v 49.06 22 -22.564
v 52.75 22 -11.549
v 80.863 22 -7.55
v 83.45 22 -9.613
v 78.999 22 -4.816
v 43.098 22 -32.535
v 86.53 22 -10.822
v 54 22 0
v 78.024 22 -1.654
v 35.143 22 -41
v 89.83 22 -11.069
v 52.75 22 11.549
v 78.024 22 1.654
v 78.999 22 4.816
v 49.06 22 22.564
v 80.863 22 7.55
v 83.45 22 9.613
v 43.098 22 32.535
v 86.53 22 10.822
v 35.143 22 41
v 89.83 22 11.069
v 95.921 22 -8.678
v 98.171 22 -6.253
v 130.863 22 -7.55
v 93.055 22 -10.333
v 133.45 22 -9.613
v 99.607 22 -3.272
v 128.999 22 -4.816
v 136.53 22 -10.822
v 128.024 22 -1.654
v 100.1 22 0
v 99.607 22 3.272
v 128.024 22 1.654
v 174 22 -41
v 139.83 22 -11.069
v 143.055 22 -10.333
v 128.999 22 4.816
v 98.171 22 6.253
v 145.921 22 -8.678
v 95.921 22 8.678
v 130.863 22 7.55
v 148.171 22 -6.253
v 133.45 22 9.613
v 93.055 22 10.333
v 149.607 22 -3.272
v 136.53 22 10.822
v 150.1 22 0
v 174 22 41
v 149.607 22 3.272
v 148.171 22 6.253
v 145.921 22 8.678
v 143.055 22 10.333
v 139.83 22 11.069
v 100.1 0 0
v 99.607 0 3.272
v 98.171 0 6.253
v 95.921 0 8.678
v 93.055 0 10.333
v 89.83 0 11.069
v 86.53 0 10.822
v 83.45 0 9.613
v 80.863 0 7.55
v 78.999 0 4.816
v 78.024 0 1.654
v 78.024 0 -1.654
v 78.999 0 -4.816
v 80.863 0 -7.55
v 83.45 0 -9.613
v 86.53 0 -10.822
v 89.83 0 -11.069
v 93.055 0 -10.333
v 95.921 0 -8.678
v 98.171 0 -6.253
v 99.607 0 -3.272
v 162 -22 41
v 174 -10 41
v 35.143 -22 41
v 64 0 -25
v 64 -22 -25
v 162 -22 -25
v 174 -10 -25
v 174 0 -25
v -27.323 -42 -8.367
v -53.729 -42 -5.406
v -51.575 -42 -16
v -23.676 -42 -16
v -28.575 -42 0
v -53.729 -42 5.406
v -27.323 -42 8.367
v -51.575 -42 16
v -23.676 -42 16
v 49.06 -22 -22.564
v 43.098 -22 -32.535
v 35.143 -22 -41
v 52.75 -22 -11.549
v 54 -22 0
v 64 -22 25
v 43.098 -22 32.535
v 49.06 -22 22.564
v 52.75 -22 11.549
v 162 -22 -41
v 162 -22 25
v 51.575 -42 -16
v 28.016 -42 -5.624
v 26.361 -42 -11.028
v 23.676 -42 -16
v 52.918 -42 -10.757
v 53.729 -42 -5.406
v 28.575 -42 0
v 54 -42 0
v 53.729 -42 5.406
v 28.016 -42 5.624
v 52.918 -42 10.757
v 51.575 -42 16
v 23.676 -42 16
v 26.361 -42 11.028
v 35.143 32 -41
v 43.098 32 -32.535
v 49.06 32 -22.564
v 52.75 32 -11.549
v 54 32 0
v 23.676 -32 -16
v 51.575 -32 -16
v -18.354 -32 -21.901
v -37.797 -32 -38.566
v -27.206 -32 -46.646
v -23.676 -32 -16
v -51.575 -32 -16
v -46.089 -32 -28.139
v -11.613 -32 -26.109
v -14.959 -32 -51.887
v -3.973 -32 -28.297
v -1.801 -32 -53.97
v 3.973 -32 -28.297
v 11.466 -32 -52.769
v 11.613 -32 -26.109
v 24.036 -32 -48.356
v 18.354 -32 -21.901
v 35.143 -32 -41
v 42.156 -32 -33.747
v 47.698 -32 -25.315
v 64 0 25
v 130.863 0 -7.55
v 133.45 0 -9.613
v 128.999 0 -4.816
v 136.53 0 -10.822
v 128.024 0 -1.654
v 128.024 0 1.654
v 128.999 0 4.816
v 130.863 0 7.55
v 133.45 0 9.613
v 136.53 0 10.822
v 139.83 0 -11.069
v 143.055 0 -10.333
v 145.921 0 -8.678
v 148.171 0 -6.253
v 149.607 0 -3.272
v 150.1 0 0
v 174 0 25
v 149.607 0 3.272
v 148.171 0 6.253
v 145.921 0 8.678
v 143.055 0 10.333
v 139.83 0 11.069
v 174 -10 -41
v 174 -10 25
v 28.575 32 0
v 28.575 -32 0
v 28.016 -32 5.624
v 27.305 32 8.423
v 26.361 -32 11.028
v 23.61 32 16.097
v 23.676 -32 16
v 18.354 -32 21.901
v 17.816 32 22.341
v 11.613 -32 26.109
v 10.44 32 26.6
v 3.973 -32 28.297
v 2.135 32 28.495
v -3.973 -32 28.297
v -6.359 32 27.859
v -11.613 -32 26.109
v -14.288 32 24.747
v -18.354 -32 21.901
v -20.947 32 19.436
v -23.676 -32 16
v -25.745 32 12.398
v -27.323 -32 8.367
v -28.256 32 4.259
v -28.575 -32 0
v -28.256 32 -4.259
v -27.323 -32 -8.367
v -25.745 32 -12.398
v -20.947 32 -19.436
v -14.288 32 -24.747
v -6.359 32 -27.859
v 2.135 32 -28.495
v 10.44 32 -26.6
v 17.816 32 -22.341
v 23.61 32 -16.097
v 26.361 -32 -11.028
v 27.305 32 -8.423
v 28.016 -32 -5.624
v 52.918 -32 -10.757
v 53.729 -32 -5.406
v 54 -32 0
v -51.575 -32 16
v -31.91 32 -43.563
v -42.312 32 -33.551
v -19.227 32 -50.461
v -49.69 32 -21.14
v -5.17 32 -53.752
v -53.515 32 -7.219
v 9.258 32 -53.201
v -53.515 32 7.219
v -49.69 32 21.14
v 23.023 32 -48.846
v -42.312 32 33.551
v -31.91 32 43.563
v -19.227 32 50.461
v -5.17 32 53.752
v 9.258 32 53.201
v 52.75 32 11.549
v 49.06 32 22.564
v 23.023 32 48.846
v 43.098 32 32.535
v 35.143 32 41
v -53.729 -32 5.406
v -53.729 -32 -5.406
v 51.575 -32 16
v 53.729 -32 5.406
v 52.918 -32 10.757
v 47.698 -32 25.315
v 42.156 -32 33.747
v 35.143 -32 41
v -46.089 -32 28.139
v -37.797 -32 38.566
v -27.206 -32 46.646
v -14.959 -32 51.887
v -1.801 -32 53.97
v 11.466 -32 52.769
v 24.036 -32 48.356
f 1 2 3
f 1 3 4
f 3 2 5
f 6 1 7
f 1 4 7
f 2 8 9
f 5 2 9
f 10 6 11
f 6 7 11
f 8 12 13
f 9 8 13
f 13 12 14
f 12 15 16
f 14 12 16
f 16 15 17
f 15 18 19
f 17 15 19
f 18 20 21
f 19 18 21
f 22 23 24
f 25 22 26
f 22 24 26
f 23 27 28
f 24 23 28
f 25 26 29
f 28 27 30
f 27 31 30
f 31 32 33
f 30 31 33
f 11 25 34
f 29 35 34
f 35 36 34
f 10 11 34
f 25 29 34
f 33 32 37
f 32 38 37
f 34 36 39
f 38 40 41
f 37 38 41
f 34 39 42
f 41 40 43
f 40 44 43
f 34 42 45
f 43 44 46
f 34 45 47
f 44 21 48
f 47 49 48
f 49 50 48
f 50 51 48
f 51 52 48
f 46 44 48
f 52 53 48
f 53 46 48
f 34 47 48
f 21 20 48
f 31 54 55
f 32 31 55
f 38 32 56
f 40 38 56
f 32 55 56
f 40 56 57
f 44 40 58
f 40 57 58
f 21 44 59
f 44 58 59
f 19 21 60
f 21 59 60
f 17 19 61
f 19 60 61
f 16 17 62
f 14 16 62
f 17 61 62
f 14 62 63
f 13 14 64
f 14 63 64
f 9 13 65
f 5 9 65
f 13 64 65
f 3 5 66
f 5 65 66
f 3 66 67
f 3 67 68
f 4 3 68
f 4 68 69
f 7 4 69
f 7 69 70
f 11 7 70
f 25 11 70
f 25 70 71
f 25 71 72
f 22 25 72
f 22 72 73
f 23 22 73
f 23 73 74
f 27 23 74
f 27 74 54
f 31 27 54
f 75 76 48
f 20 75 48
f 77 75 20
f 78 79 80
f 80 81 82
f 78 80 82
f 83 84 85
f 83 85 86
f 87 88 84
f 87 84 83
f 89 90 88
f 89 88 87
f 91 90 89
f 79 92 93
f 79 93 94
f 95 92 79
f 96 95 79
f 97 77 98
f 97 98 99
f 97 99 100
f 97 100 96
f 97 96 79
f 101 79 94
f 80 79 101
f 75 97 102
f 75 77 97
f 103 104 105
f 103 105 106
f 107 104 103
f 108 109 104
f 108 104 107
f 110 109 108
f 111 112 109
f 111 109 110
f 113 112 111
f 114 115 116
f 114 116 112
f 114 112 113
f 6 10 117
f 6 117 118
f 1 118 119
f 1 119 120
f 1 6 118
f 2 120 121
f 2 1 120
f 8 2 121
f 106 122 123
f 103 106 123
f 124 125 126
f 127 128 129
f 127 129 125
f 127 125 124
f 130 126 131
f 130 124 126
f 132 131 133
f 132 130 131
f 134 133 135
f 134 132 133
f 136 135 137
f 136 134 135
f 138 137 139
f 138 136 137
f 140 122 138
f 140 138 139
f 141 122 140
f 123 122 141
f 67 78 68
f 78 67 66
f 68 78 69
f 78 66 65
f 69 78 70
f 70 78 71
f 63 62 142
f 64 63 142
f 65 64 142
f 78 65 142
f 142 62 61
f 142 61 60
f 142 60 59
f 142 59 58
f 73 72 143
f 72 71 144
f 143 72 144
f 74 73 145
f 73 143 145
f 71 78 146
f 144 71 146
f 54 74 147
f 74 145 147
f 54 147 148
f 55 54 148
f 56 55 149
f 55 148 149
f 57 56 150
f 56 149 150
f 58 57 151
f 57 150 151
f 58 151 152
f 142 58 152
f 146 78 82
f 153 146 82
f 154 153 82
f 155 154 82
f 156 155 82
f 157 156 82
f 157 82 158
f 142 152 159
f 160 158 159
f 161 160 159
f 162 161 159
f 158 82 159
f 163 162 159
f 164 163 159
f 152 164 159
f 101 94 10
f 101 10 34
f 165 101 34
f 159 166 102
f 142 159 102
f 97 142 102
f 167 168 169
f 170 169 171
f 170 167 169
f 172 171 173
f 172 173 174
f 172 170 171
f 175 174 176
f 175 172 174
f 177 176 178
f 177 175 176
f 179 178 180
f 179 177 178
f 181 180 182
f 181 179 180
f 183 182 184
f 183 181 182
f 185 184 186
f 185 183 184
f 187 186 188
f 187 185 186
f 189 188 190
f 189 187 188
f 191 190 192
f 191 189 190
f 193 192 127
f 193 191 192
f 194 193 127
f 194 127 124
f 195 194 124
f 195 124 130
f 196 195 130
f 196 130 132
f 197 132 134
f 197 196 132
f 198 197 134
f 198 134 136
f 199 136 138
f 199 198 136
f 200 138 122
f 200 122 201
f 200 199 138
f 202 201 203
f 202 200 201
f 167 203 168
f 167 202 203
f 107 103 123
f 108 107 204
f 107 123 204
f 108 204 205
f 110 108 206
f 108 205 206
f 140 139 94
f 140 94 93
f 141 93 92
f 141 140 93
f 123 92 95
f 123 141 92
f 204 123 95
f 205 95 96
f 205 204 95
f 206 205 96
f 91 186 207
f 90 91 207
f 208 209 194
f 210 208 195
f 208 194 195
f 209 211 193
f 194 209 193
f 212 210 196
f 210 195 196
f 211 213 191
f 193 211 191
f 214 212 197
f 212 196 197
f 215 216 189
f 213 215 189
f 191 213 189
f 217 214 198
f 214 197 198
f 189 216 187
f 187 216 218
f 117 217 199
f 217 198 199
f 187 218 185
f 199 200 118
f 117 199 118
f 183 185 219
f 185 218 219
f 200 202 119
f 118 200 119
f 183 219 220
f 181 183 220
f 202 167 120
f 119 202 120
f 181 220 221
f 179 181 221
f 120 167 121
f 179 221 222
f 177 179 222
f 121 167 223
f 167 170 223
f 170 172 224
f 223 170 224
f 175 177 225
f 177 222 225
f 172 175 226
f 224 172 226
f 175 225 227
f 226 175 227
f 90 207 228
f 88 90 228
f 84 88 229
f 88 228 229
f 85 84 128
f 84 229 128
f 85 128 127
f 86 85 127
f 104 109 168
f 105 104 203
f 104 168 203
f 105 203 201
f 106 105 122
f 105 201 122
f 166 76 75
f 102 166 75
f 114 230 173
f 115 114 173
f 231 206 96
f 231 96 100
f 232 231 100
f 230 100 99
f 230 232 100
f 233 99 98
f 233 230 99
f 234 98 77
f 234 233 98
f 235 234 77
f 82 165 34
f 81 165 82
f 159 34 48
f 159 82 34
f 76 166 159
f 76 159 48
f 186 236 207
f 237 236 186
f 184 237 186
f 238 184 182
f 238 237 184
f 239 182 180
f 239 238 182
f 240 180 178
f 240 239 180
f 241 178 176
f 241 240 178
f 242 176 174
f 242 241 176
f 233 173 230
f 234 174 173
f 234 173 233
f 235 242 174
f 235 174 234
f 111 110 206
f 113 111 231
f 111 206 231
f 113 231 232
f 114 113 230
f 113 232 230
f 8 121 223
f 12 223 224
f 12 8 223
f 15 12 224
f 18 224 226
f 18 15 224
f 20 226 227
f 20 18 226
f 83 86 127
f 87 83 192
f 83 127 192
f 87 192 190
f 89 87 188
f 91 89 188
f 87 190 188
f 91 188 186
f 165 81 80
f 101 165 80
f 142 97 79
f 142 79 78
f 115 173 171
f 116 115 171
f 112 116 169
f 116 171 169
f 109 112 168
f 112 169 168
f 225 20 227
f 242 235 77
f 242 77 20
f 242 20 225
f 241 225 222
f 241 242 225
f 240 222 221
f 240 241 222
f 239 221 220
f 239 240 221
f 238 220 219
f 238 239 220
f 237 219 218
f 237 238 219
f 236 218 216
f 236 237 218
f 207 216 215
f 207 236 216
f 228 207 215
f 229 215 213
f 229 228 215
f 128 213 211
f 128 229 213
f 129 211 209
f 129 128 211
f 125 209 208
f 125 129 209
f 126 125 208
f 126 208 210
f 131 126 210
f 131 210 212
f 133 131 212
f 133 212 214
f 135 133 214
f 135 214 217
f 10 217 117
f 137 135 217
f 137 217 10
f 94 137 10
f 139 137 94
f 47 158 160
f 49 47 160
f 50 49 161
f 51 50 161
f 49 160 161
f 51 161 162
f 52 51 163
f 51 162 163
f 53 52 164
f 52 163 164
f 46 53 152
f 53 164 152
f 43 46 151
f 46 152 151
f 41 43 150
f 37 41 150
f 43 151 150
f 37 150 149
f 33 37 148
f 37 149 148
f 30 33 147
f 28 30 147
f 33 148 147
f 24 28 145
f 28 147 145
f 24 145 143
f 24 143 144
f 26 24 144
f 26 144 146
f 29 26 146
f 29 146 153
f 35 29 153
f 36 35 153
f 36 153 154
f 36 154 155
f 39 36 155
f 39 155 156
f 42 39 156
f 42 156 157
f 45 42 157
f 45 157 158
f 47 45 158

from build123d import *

# Parameters (mm, degrees)
F0_R      = 28.575
F1_DEPTH  = 32
F2_DEPTH  = 22
F4_DEPTH  = 95.001
F5_W      = 12
F5_H      = 50
F5_W_2    = 10
F6_DEPTH  = 110
F8_DEPTH  = 10
F9_R      = 11.1
F10_DEPTH = 32.001


with BuildPart() as f1:
    # F0 (on Front) → F1 (new body, symmetric)
    with BuildSketch(Plane.XZ):
        with BuildLine():
            ThreePointArc((35.142567, -41), (49.05965, -22.564368), (54, 0))
            ThreePointArc((54, 0), (49.05965, 22.564368), (35.142567, 41))
            ThreePointArc((35.142567, 41), (-54, 0), (35.142567, -41))
        make_face()
        Circle(F0_R, mode=Mode.SUBTRACT)
    extrude(amount=F1_DEPTH, both=True)

    # F0 (on Front) → F2 (join, symmetric)
    with BuildSketch(Plane.XZ):
        with BuildLine():
            ThreePointArc((35.142567, 41), (49.05965, 22.564368), (54, 0))
            ThreePointArc((54, 0), (49.05965, -22.564368), (35.142567, -41))
            Line((35.142567, -41), (174, -41))
            Line((174, -41), (174, 41))
            Line((174, 41), (35.142567, 41))
        make_face()
    extrude(amount=F2_DEPTH, both=True)

    # F3 (on face) → F4 (cut, through all)
    with BuildSketch(Plane.XY.offset(41)):
        Polygon((174, -10), (162, -22), (174, -22), align=None)
    extrude(amount=-F4_DEPTH, mode=Mode.SUBTRACT)

    # F5 (on face) → F6 (cut)
    with BuildSketch(Plane.YZ.offset(174)):
        with Locations((-16, 0)):
            Rectangle(F5_W, F5_H)
        with Locations((-5, 0)):
            Rectangle(F5_W_2, F5_H)
    extrude(amount=-F6_DEPTH, mode=Mode.SUBTRACT)

    # F7 (on face) → F8 (join)
    with BuildSketch(Plane.XZ.offset(32)):
        with BuildLine():
            Line((-23.675528, 16), (-51.575188, 16))
            ThreePointArc((-51.575188, 16), (-54, 0), (-51.575188, -16))
            Line((-51.575188, -16), (-23.675528, -16))
            ThreePointArc((-23.675528, -16), (-28.575, 0), (-23.675528, 16))
        make_face()
        with BuildLine():
            Line((51.575188, 16), (23.675528, 16))
            ThreePointArc((23.675528, 16), (27.322691, 8.366672), (28.575, 0))
            ThreePointArc((28.575, 0), (27.322691, -8.366672), (23.675528, -16))
            Line((23.675528, -16), (51.575188, -16))
            ThreePointArc((51.575188, -16), (53.390356, -8.091349), (54, 0))
            ThreePointArc((54, 0), (53.390356, 8.091349), (51.575188, 16))
        make_face()
    extrude(amount=F8_DEPTH)

    # F9 (on face) → F10 (cut, through all)
    with BuildSketch(Plane.XZ):
        with Locations((89, 0)):
            Circle(F9_R)
        with Locations((139, 0)):
            Circle(F9_R)
    extrude(amount=-F10_DEPTH, mode=Mode.SUBTRACT)


solid = f1.part
